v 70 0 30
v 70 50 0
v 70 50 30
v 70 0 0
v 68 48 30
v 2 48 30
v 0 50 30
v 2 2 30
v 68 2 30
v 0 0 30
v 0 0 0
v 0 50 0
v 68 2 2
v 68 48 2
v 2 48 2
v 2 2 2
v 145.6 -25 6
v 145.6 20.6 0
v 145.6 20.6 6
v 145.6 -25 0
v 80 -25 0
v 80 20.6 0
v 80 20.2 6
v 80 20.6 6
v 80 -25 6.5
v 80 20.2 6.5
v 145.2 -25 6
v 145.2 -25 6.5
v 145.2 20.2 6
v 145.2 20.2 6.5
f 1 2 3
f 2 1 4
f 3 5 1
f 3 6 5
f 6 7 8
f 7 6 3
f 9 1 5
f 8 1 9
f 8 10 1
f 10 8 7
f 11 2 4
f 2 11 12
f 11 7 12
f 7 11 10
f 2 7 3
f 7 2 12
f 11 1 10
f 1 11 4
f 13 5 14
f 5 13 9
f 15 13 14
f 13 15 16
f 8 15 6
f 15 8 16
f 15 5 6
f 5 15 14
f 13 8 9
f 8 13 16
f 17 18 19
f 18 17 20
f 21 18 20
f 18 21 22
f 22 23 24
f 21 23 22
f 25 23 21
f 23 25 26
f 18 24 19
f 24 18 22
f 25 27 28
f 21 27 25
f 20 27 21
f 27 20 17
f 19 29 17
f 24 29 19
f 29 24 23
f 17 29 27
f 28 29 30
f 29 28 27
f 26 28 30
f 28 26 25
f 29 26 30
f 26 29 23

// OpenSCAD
// Two-part enclosure for small electronics board
// Print orientation: box on bed (z = 0), lid on +X side, both build upward

// ---------- Parameters ----------
box_x      = 70;    // box outer length (X)
box_y      = 50;    // box outer width (Y)
box_z      = 30;    // box outer height (Z)
box_wall   = 2;     // box wall thickness
box_floor  = 2;     // box floor thickness

lip_x      = 65.6;  // lip outer length (X)
lip_y      = 45.6;  // lip outer width (Y)
lip_wall   = 1.5;   // lip wall thickness
lip_h      = 4;     // lip height (from plate top)

gap        = 10;    // gap between box and lid
plate_t    = 2;     // lid plate thickness

eps        = 0.5;   // cutter overshoot

$fn = 64;

// ---------- Model ----------
union() {
    // Box
    difference() {
        cube([box_x, box_y, box_z]);
        translate([box_wall, box_wall, box_floor])
            cube([box_x - 2*box_wall, box_y - 2*box_wall, box_z - box_floor]); // hollow body
    }

    // Lid: plate + lip, printed upside down
    translate([box_x + gap, -box_y/2, 0]) {
        union() {
            // Plate
            cube([lip_x, lip_y, plate_t]);
            // Lip
            translate([0, 0, plate_t])
                cube([lip_x, lip_y, lip_h]);
        }
        // Cut lip pocket (extends past top face)
        translate([0, 0, plate_t])
            cube([lip_x - 0.4, lip_y - 0.4, lip_h + eps]);
    }
}
